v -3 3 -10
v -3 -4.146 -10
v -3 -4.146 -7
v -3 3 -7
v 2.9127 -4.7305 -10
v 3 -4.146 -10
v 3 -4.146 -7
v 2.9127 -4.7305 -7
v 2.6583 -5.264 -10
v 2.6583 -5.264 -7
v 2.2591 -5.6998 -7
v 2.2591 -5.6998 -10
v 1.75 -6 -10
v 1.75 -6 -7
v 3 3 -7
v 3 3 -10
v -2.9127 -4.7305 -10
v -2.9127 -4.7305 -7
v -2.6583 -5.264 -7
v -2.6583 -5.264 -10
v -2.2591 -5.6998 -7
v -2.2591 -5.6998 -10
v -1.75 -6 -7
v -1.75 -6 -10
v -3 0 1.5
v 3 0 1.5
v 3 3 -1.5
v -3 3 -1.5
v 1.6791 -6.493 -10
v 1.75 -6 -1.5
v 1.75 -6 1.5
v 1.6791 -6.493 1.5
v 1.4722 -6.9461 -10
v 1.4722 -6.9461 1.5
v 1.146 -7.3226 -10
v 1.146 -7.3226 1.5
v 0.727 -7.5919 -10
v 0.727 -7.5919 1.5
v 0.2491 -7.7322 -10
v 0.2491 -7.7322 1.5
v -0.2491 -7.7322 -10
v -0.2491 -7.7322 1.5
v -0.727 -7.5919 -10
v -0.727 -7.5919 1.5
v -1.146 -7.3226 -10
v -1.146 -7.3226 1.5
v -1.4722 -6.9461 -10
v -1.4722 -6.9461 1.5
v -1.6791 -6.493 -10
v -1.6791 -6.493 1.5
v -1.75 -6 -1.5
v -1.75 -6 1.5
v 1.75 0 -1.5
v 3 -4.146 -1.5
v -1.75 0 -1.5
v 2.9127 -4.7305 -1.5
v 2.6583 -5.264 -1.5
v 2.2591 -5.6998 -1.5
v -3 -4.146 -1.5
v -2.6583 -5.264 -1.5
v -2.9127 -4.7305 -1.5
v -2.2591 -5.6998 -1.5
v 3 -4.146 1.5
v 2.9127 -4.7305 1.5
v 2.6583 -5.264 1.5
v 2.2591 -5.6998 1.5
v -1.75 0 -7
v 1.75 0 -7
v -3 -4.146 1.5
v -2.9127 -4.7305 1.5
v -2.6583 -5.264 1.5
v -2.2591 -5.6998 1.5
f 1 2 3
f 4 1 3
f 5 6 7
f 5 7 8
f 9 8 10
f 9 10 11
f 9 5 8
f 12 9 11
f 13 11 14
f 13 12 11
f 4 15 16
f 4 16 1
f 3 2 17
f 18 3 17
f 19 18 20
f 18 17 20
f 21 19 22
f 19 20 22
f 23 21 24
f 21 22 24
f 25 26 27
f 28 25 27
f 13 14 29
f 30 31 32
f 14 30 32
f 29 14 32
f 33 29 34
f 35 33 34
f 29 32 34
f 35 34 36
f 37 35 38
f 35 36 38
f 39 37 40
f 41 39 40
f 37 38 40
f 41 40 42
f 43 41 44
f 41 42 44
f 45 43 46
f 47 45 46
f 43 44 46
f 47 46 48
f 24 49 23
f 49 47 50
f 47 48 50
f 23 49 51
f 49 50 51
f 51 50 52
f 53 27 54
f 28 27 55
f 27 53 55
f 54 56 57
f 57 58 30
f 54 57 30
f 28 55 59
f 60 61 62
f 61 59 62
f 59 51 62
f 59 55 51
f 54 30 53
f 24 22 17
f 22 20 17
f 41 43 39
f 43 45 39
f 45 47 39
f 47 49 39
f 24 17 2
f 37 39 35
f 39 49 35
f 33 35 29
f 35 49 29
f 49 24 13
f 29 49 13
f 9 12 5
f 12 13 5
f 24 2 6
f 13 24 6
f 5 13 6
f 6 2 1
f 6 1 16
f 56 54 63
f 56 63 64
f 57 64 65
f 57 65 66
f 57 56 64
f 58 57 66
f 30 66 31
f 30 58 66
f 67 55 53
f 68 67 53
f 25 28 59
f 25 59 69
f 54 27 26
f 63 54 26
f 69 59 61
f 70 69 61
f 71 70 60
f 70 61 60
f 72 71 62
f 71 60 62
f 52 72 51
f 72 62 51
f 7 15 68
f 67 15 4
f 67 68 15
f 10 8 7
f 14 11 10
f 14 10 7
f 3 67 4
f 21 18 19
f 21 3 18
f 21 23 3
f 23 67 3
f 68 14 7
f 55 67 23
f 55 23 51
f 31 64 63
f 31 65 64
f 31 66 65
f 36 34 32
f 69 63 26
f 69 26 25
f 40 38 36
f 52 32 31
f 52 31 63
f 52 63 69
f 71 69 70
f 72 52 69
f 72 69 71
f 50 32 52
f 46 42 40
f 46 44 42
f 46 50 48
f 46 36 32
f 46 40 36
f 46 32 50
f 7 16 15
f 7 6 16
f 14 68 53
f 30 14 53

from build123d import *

# Parameters (mm, degrees)
F0_W        = 3.5
F0_H        = 5.5
F1_DEPTH    = 6
F2_W        = 1.75
F2_H        = 11.5
F4_T1_DEPTH = 12.2702481089
F4_T3_DEPTH = 12.2702481089
F5_W        = 6
F5_H        = 3
F6_DEPTH    = 3
F8_DEPTH    = 25


# Not quite as in the source:
# - a fillet or chamfer that OpenCascade refuses, or shapes differently, is made with other operations: its cross-section is extruded or revolved along the edge and cut away or added


with BuildPart() as f1:
    # F0 (on Front) → F1 (new body)
    with BuildSketch(Plane.XZ):
        Polygon((1.75, -1.5), (3, -1.5), (3, 1.5), (-3, 1.5), (-3, -1.5), (-1.75, -1.5), align=None)
        with Locations((0, -4.25)):
            Rectangle(F0_W, F0_H)
        Polygon((3, -7), (1.75, -7), (-1.75, -7), (-3, -7), (-3, -10), (3, -10), align=None)
    extrude(amount=F1_DEPTH)

    # F2 (on face) → F3 (revolve)
    with BuildSketch(Plane.XZ.offset(6)):
        with Locations((-0.875, -4.25)):
            Rectangle(F2_W, F2_H)
    revolve(axis=Axis((0, -6, -4.25), (0, 0, -1)))

    # F4: fillet of radius 2 on 4 edges, made by hand

    # F4_s2 → F4_t1 (cut)
    with BuildSketch(Plane.XY.offset(-6.1351240544)):
        with BuildLine():
            ThreePointArc((3, -4.1459503782), (2.6583123952, -5.263984367), (1.75, -6))
            Line((1.75, -6), (3, -6))
            Line((3, -6), (3, -4.1459503782))
        make_face()
        with BuildLine():
            ThreePointArc((-3, -4.1459503782), (-2.6583123952, -5.263984367), (-1.75, -6))
            Line((-1.75, -6), (-3, -6))
            Line((-3, -6), (-3, -4.1459503782))
        make_face()
    extrude(amount=F4_T1_DEPTH, mode=Mode.SUBTRACT)

    # F4_s4 → F4_t3 (cut)
    with BuildSketch(Plane.XY.offset(-14.6351240544)):
        with BuildLine():
            ThreePointArc((3, -4.1459503782), (2.6583123952, -5.263984367), (1.75, -6))
            Line((1.75, -6), (3, -6))
            Line((3, -6), (3, -4.1459503782))
        make_face()
        with BuildLine():
            ThreePointArc((-3, -4.1459503782), (-2.6583123952, -5.263984367), (-1.75, -6))
            Line((-1.75, -6), (-3, -6))
            Line((-3, -6), (-3, -4.1459503782))
        make_face()
    extrude(amount=F4_T3_DEPTH, mode=Mode.SUBTRACT)

    # F5 (on face) → F6 (join)
    with BuildSketch(Plane(origin=(0, 0, 0), x_dir=(-1, 0, 0), z_dir=(0, 1, 0))):
        Rectangle(F5_W, F5_H)
        with Locations((0, -8.5)):
            Rectangle(F5_W, F5_H)
    extrude(amount=F6_DEPTH)

    # F7 (on face) → F8 (cut)
    with BuildSketch(Plane.YZ.offset(3)):
        Polygon((0, 1.5), (3, -1.5), (3, 1.5), align=None)
    extrude(amount=-F8_DEPTH, mode=Mode.SUBTRACT)


solid = f1.part
